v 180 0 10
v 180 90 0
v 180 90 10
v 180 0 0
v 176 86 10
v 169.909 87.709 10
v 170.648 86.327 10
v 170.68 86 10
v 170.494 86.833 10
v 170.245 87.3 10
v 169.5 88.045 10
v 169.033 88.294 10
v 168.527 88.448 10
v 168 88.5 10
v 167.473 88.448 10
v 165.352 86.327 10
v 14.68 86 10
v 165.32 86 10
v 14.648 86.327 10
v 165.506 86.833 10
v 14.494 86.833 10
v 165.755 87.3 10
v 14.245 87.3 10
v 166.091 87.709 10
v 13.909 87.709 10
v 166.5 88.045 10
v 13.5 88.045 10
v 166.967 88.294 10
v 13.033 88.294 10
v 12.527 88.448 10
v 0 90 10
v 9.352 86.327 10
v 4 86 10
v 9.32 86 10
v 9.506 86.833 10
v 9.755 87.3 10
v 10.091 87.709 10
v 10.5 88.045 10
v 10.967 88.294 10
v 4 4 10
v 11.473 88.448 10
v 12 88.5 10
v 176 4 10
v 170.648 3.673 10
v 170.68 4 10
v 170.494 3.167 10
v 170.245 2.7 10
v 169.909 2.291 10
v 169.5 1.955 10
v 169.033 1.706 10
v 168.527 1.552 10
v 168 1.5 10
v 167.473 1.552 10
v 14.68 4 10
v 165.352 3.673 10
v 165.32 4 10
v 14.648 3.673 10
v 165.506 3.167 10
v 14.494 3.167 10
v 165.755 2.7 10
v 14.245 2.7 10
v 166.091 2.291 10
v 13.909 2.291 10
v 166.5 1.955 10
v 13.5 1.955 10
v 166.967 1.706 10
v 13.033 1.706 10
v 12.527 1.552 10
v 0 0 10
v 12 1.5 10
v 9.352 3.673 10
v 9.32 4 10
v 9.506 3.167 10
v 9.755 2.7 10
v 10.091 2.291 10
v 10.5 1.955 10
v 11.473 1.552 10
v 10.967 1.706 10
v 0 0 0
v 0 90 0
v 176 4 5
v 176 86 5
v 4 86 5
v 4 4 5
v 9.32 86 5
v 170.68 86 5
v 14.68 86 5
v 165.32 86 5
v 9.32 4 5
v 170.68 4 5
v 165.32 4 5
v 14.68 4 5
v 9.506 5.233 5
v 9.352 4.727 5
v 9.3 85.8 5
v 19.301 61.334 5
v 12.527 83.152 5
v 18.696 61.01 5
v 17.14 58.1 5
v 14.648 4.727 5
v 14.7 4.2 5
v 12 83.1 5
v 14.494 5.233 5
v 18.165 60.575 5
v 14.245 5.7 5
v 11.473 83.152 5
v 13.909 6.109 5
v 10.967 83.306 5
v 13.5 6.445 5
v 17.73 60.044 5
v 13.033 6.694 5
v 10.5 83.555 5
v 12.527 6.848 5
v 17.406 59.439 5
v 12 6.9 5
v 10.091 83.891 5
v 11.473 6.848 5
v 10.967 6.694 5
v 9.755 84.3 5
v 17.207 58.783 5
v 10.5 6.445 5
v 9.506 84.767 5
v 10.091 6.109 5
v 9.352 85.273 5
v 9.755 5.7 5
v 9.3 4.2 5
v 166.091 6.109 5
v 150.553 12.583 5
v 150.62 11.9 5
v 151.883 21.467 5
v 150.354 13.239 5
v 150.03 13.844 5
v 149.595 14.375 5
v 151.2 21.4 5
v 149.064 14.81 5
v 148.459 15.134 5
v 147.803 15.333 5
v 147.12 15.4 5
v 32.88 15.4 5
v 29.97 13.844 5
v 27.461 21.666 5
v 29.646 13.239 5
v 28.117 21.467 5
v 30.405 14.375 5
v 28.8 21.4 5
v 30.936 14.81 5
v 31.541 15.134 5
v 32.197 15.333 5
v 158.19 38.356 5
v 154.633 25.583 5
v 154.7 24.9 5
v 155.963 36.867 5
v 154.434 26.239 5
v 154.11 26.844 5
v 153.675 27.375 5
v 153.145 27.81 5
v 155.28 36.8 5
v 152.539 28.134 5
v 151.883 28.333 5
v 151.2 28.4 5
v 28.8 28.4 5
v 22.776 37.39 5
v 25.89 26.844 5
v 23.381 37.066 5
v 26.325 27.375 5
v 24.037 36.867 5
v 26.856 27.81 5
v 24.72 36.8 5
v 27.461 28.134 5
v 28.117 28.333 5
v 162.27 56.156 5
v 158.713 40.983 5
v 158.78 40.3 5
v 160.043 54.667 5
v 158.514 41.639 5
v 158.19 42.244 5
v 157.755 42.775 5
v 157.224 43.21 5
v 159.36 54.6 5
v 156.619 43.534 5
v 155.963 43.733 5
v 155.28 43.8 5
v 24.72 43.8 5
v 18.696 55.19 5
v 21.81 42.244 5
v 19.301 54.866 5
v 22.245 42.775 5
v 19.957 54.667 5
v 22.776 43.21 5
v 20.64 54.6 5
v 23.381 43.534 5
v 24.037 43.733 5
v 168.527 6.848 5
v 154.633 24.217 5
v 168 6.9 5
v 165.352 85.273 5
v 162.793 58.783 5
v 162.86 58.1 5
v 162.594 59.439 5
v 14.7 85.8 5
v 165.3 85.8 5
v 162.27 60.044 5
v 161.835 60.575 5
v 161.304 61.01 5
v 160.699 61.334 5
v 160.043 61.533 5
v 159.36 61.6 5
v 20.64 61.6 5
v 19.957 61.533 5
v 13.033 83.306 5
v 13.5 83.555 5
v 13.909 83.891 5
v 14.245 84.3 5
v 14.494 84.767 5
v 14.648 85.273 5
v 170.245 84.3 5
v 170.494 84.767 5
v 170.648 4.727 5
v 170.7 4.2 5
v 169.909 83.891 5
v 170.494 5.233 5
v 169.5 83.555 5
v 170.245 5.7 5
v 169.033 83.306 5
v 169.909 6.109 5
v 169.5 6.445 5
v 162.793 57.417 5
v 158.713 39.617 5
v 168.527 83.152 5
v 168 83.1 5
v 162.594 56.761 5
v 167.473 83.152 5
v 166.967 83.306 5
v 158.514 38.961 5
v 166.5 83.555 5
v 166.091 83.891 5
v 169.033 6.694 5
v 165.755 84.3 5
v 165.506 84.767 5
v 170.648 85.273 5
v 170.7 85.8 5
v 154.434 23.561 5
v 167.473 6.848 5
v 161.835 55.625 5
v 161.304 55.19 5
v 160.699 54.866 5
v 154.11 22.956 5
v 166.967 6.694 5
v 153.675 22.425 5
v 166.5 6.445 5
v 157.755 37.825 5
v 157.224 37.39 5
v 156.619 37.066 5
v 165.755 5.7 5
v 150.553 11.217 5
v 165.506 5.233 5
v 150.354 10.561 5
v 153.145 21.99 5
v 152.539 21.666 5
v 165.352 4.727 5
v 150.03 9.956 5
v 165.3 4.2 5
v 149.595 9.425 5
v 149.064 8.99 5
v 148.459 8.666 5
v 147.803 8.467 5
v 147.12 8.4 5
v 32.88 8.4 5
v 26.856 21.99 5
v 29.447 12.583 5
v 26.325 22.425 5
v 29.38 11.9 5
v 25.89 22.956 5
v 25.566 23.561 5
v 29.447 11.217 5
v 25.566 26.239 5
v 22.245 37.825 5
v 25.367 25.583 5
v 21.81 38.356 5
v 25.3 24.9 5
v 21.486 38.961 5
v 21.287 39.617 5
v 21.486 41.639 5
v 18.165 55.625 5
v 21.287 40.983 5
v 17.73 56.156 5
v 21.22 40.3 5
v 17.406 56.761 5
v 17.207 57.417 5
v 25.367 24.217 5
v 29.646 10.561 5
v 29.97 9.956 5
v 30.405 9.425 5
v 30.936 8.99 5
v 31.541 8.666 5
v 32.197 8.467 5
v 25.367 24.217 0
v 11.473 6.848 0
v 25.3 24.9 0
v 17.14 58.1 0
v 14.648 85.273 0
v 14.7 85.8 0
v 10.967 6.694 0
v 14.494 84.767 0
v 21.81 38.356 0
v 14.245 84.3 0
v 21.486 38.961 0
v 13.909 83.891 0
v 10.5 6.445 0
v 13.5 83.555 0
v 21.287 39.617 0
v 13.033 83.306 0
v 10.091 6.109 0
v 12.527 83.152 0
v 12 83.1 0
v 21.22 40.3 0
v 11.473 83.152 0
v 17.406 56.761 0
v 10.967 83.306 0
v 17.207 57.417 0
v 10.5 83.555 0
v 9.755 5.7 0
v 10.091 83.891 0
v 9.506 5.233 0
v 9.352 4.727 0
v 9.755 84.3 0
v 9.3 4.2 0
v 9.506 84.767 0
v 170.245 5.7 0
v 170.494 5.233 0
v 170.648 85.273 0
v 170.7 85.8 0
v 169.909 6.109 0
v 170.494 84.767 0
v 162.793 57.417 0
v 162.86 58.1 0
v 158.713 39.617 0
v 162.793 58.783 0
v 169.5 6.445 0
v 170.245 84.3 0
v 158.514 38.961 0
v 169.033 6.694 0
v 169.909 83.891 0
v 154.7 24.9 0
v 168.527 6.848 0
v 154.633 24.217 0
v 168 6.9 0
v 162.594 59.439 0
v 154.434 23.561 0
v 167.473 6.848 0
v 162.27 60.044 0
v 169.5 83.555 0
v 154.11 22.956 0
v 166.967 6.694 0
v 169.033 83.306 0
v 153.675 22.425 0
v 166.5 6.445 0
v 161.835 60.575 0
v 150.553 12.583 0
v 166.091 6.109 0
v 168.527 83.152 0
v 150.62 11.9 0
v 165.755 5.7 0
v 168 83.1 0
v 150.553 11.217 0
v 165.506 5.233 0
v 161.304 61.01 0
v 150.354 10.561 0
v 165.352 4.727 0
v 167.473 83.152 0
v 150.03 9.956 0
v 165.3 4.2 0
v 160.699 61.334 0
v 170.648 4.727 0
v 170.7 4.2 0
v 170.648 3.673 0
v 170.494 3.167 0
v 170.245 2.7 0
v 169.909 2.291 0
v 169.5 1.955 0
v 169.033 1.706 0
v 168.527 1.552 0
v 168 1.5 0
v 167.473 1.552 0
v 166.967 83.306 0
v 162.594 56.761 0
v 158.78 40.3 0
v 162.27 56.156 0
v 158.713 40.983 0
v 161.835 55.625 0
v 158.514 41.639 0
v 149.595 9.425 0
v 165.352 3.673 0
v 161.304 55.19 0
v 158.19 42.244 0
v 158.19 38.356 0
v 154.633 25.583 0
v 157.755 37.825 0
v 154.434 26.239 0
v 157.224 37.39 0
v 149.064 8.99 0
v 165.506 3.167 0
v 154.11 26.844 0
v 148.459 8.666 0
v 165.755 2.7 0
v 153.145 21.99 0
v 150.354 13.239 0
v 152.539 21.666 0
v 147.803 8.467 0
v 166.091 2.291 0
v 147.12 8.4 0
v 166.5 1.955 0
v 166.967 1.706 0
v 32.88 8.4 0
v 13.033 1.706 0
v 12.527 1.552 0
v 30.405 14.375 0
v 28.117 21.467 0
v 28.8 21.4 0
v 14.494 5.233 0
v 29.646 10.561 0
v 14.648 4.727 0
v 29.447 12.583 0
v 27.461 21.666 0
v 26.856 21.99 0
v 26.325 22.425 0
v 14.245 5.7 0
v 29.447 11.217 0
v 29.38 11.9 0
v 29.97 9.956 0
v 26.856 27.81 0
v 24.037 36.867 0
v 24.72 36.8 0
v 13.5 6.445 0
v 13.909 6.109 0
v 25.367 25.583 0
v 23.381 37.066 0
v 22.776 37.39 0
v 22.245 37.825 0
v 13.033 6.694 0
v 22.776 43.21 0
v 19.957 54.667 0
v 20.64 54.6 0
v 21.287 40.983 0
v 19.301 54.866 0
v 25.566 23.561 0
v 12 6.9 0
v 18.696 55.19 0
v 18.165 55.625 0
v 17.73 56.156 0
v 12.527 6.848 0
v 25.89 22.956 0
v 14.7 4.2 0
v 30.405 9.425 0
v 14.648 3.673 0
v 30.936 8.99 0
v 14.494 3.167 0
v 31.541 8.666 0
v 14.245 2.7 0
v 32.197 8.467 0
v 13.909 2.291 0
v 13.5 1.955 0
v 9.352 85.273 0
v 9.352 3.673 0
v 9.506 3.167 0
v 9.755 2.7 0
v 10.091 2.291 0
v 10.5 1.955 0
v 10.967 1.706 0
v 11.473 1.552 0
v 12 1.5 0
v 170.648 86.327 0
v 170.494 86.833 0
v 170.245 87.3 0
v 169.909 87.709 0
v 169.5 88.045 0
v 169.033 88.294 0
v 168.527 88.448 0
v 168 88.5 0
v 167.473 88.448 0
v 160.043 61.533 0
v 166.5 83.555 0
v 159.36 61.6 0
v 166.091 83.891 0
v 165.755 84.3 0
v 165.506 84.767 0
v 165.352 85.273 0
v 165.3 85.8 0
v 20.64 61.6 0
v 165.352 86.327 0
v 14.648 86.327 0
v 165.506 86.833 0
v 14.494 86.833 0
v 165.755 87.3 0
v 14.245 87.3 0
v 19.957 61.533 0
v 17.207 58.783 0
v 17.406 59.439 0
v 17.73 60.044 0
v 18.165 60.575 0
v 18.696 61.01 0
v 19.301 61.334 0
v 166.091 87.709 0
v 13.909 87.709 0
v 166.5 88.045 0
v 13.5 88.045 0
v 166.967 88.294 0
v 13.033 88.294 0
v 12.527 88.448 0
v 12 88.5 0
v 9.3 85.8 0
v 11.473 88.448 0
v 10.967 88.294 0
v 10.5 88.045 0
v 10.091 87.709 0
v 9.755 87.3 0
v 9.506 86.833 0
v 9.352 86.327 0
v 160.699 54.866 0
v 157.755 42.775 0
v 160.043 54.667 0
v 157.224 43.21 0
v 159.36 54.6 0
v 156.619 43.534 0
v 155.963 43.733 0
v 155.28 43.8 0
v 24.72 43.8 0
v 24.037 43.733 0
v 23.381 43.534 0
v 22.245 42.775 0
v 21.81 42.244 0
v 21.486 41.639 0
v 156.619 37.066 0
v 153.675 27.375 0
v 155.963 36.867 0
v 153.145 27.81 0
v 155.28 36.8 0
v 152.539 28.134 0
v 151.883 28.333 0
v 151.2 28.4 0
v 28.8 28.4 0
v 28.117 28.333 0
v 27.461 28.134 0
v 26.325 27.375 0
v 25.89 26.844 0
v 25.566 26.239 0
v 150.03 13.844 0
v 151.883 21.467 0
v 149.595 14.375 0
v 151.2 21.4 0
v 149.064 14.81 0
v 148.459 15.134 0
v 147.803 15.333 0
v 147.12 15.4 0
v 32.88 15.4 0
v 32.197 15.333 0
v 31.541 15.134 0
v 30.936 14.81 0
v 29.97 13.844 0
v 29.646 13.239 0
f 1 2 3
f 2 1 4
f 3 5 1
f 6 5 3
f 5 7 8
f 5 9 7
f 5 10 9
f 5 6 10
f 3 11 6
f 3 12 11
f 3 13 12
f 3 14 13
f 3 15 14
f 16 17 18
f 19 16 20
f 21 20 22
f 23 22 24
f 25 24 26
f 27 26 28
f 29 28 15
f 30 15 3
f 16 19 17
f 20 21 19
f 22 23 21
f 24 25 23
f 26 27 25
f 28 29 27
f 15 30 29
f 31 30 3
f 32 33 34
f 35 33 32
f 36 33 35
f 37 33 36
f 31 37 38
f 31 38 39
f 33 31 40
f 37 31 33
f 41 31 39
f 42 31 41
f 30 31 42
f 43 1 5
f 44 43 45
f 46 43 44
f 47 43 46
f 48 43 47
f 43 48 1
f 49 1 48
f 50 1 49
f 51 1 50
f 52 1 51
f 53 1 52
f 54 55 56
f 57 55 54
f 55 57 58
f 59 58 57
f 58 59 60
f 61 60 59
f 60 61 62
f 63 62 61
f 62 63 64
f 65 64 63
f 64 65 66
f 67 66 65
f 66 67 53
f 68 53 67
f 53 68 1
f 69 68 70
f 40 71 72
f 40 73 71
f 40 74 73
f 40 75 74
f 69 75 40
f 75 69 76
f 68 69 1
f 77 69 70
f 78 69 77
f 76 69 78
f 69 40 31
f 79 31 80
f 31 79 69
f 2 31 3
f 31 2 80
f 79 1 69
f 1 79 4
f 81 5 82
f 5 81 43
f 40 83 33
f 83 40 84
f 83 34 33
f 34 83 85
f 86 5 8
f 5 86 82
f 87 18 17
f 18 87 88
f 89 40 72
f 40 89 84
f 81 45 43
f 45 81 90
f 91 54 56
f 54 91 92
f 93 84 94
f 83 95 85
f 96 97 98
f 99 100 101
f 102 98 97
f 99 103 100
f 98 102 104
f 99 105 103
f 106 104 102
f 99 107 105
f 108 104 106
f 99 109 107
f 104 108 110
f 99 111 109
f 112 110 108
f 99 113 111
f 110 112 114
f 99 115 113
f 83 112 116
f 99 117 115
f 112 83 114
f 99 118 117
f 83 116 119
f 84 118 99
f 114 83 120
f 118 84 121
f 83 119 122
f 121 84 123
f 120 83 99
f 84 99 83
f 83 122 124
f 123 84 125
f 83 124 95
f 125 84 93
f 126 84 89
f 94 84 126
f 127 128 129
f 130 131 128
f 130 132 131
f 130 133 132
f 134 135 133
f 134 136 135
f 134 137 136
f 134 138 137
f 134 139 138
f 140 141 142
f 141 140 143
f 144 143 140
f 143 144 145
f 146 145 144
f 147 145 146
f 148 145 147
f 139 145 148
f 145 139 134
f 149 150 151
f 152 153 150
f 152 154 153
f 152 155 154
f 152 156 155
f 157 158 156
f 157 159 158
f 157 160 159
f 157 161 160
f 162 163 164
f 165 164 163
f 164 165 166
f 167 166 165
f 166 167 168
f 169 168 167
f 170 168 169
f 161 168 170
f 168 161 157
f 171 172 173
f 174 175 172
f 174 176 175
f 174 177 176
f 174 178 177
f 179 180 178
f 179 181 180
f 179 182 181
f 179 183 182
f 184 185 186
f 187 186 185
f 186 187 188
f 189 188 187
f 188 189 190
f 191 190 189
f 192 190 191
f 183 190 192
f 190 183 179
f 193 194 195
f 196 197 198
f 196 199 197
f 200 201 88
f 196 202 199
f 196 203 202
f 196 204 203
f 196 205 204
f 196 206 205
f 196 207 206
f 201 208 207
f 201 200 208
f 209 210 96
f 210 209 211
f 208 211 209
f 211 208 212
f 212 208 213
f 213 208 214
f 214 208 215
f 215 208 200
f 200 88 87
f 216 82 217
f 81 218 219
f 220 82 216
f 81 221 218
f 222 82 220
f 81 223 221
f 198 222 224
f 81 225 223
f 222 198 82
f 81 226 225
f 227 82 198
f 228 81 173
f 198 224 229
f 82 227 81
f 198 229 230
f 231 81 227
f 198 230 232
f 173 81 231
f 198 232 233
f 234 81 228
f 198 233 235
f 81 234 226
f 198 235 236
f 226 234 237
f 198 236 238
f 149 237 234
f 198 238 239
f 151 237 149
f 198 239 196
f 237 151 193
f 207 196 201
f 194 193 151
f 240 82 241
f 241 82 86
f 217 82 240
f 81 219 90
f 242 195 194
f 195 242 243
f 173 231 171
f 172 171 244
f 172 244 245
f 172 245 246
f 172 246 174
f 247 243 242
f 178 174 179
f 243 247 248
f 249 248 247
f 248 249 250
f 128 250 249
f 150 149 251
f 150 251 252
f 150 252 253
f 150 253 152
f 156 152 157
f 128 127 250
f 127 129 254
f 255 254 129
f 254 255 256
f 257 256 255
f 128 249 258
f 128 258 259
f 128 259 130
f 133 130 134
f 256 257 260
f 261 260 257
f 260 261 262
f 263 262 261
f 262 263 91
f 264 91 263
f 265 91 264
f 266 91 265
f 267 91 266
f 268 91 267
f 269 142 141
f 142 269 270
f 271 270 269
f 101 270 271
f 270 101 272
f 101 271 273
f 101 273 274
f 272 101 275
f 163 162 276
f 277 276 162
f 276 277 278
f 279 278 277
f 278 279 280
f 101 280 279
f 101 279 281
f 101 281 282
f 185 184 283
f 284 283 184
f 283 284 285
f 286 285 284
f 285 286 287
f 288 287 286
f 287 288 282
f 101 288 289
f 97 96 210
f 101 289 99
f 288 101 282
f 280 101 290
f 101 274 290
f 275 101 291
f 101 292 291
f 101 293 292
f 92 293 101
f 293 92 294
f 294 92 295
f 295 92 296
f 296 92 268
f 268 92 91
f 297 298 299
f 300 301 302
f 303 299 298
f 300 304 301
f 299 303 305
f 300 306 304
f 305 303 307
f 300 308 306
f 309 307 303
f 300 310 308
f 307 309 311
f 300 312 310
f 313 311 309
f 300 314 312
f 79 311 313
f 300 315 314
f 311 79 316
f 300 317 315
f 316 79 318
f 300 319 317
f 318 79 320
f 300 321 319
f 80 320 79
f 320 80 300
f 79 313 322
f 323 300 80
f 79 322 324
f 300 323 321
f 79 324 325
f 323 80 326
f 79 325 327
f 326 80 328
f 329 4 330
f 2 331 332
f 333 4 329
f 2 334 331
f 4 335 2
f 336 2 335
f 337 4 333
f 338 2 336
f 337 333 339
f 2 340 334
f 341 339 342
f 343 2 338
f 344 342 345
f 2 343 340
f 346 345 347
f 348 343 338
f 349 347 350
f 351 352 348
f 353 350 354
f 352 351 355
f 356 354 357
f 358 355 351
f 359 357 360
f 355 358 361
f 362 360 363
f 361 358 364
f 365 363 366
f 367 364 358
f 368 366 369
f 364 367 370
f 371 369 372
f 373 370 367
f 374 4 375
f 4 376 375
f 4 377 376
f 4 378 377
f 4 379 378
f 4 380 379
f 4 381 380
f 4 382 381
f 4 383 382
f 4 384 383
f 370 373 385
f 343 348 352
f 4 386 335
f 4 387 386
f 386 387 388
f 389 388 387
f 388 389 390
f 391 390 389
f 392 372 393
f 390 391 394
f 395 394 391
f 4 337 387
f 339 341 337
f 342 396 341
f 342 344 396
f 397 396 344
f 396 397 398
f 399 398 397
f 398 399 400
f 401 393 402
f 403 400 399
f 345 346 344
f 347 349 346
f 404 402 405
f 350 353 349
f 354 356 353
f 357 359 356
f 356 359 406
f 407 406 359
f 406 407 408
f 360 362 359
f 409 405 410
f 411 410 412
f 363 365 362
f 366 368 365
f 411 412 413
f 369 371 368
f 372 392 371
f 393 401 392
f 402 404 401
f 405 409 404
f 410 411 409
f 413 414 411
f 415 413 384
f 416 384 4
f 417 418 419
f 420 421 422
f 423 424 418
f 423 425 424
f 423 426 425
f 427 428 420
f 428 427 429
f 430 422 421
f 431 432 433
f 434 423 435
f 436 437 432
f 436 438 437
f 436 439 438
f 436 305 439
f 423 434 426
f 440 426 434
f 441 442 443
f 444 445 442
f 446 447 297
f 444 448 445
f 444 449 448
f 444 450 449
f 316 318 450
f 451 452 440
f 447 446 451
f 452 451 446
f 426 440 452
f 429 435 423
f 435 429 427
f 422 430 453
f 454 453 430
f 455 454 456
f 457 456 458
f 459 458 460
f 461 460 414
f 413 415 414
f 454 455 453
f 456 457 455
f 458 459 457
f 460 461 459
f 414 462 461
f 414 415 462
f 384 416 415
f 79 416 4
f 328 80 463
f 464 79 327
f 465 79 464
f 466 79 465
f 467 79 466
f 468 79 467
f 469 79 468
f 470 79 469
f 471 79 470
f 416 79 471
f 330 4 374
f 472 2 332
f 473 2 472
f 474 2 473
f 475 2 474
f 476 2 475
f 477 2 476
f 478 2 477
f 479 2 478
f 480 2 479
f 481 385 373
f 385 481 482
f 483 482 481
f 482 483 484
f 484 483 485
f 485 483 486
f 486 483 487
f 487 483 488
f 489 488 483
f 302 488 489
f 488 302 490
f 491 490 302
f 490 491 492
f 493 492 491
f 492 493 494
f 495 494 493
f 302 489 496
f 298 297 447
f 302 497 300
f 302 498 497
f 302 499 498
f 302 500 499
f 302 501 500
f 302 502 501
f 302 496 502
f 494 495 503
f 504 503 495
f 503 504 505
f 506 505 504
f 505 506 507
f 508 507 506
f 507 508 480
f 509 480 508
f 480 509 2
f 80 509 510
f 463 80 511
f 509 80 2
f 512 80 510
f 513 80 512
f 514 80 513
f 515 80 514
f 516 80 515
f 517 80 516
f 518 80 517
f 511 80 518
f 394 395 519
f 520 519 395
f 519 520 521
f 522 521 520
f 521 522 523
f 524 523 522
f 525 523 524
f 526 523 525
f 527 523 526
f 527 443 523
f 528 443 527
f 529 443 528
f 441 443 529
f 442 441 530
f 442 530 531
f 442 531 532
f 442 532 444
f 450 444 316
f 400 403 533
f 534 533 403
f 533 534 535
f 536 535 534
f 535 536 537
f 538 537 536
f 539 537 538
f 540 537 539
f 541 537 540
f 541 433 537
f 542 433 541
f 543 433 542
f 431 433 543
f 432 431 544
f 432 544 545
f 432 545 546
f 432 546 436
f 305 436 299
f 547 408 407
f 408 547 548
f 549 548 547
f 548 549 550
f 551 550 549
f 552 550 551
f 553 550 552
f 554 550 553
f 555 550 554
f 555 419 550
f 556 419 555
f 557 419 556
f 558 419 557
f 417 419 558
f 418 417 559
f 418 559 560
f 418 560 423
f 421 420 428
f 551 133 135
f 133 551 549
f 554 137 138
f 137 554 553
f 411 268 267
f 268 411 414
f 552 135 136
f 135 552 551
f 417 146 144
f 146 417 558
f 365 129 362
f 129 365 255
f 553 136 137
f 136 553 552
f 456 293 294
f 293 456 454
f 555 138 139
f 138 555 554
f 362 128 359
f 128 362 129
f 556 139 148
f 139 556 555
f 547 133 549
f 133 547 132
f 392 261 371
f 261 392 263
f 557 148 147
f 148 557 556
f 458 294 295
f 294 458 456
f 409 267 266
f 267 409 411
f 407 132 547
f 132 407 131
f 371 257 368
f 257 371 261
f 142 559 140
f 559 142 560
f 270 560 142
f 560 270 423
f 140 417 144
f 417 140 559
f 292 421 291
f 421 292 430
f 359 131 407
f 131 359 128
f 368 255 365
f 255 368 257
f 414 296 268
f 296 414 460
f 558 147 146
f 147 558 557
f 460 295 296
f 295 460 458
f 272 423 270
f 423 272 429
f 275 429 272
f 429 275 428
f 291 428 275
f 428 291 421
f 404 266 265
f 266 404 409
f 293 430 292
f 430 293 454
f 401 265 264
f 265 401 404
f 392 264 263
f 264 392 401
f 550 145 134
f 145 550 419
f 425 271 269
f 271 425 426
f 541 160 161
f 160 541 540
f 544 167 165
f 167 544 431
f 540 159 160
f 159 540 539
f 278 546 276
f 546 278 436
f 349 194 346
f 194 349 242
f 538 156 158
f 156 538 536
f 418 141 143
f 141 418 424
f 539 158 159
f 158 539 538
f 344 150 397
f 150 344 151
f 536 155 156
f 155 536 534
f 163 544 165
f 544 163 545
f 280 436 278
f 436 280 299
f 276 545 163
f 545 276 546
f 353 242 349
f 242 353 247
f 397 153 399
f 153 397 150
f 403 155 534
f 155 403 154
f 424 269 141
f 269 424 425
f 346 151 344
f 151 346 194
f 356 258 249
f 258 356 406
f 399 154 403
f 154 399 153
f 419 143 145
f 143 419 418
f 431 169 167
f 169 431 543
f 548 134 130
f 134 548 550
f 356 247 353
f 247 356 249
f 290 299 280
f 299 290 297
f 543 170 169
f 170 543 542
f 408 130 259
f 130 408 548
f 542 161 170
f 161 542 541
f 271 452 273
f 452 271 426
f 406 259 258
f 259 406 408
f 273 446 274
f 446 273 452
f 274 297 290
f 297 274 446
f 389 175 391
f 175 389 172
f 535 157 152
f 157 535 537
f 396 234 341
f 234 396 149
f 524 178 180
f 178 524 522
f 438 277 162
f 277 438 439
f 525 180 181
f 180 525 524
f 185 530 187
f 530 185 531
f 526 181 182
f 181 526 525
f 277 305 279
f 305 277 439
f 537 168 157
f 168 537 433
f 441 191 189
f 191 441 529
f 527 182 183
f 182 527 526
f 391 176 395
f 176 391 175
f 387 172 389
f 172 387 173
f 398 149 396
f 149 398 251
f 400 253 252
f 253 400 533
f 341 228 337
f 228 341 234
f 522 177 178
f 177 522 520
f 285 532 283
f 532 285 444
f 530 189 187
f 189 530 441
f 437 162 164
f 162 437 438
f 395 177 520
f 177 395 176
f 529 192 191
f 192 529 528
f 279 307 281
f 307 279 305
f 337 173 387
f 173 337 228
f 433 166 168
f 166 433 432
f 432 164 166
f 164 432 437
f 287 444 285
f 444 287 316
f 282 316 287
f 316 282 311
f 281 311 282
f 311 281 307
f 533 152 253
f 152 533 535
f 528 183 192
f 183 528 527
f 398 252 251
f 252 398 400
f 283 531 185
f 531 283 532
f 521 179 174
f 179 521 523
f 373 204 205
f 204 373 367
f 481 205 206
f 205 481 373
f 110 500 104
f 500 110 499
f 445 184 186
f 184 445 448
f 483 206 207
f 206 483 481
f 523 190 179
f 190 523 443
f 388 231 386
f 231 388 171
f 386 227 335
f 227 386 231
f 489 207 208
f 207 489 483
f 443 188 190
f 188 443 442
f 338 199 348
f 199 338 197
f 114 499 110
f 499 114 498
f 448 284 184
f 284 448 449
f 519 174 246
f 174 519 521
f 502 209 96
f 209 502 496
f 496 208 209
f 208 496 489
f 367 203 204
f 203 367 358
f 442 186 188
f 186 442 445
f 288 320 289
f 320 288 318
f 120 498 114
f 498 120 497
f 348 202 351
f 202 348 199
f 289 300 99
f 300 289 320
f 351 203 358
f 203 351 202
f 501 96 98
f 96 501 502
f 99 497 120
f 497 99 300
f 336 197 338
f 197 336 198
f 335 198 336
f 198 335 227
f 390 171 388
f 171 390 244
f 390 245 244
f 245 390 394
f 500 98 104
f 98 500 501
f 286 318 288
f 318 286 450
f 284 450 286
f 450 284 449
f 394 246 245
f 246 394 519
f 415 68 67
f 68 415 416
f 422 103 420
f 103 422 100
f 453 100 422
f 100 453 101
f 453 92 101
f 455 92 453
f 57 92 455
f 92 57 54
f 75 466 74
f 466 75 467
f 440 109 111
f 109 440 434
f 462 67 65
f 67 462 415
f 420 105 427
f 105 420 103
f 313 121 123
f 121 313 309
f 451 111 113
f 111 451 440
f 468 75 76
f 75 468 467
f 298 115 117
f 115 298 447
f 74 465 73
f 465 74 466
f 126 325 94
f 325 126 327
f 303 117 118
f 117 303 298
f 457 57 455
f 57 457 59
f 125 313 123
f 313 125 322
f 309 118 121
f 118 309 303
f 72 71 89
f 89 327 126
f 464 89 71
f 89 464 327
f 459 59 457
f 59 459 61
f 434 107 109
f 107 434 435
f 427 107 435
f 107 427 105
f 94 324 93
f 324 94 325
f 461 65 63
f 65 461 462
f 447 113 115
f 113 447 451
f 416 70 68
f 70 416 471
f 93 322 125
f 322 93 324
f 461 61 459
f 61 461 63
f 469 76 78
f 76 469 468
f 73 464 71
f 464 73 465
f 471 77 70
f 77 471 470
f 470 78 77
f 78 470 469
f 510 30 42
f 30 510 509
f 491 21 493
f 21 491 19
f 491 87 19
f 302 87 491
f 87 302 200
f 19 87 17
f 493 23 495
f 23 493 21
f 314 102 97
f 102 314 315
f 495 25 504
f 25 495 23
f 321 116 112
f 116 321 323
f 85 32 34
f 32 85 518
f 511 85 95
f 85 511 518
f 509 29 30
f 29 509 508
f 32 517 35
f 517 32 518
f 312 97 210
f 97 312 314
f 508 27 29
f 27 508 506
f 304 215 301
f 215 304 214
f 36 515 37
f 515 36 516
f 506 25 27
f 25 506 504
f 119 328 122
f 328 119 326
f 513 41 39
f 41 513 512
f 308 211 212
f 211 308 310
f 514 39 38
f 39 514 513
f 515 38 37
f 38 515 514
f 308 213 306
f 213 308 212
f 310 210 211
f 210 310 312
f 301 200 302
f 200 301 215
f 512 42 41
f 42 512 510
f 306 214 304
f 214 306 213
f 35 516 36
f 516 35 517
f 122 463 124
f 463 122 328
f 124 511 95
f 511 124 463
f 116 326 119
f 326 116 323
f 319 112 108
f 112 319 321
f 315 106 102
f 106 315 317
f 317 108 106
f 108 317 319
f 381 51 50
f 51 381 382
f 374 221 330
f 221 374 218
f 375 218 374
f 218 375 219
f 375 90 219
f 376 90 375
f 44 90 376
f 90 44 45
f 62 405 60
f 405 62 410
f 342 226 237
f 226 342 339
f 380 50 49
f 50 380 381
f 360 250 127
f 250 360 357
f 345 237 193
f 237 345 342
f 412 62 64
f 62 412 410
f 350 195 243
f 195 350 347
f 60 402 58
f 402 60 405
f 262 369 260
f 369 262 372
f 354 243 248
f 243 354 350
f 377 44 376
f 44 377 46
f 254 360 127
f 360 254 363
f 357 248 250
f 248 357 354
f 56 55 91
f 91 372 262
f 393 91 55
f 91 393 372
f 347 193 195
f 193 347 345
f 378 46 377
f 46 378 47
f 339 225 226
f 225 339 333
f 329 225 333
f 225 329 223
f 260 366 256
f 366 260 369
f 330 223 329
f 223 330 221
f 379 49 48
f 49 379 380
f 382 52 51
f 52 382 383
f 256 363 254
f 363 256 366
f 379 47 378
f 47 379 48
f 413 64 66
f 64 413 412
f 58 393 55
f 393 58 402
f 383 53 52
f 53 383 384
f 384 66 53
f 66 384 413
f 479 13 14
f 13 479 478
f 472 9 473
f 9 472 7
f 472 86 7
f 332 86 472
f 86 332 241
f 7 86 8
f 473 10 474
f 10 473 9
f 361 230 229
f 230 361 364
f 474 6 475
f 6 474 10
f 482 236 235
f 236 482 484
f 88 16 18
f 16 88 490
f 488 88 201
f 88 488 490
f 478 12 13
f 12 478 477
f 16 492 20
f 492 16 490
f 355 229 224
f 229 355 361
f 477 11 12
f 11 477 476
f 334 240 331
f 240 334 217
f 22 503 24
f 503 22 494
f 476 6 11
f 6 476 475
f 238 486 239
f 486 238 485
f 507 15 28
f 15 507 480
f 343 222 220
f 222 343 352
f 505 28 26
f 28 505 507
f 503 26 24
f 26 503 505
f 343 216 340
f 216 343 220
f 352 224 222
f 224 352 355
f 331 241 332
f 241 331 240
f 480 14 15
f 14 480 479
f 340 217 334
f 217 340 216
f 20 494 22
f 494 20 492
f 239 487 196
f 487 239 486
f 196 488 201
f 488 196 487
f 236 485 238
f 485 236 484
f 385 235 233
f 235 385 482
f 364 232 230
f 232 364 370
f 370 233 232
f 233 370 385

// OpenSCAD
$fn = 32;

// ----------------------------------------------------------------------
// Slotted panel: 180 x 90 mm, 4 ряда of slots
// ----------------------------------------------------------------------

// --- parameters (mm) ---
panel_w = 180;            // panel width
panel_d = 90;             // panel depth
thick = 5;                // panel thickness
slot_w = 7;               // slot width
pitch0 = 13;              // first row pitch
pitch_step = 2.4;         // pitch increase per row
margin = 8.4;             // margin around the slot field
rows = 4;                 // number of slot rows
mount_d = 5.4;            // mounting holes
mount_x = 78;             // mounting hole offset
rim_h = 10;               // rim height
rim_t = 4;                // rim wall thickness

difference() {
  union() {
    cube([panel_w, panel_d, thick]);
    translate([0, 0, thick - 1]) difference() {
      cube([panel_w, panel_d, rim_h - thick + 1]);
      translate([rim_t, rim_t, -2.5]) cube([panel_w - 2 * rim_t, panel_d - 2 * rim_t, rim_h - thick + 6]);
    }
  }
  /* slot rows: stadium shaped cutters, 2.5 mm clear of both faces */
  /* row 0: pitch 13, length 114.24 */
  hull() {
    translate([32.88, 11.9, -2.5]) cylinder(h = thick + 5, d = slot_w);
    translate([147.12, 11.9, -2.5]) cylinder(h = thick + 5, d = slot_w);
  }
  /* row 1: pitch 15.4, length 122.4 */
  hull() {
    translate([28.8, 24.9, -2.5]) cylinder(h = thick + 5, d = slot_w);
    translate([151.2, 24.9, -2.5]) cylinder(h = thick + 5, d = slot_w);
  }
  /* row 2: pitch 17.8, length 130.56 */
  hull() {
    translate([24.72, 40.3, -2.5]) cylinder(h = thick + 5, d = slot_w);
    translate([155.28, 40.3, -2.5]) cylinder(h = thick + 5, d = slot_w);
  }
  /* row 3: pitch 20.2, length 138.72 */
  hull() {
    translate([20.64, 58.1, -2.5]) cylinder(h = thick + 5, d = slot_w);
    translate([159.36, 58.1, -2.5]) cylinder(h = thick + 5, d = slot_w);
  }
  translate([12, 4.2, -2.5]) cylinder(h = 15, d = mount_d);
  translate([12, 85.8, -2.5]) cylinder(h = 15, d = mount_d);
  translate([168, 4.2, -2.5]) cylinder(h = 15, d = mount_d);
  translate([168, 85.8, -2.5]) cylinder(h = 15, d = mount_d);
}
